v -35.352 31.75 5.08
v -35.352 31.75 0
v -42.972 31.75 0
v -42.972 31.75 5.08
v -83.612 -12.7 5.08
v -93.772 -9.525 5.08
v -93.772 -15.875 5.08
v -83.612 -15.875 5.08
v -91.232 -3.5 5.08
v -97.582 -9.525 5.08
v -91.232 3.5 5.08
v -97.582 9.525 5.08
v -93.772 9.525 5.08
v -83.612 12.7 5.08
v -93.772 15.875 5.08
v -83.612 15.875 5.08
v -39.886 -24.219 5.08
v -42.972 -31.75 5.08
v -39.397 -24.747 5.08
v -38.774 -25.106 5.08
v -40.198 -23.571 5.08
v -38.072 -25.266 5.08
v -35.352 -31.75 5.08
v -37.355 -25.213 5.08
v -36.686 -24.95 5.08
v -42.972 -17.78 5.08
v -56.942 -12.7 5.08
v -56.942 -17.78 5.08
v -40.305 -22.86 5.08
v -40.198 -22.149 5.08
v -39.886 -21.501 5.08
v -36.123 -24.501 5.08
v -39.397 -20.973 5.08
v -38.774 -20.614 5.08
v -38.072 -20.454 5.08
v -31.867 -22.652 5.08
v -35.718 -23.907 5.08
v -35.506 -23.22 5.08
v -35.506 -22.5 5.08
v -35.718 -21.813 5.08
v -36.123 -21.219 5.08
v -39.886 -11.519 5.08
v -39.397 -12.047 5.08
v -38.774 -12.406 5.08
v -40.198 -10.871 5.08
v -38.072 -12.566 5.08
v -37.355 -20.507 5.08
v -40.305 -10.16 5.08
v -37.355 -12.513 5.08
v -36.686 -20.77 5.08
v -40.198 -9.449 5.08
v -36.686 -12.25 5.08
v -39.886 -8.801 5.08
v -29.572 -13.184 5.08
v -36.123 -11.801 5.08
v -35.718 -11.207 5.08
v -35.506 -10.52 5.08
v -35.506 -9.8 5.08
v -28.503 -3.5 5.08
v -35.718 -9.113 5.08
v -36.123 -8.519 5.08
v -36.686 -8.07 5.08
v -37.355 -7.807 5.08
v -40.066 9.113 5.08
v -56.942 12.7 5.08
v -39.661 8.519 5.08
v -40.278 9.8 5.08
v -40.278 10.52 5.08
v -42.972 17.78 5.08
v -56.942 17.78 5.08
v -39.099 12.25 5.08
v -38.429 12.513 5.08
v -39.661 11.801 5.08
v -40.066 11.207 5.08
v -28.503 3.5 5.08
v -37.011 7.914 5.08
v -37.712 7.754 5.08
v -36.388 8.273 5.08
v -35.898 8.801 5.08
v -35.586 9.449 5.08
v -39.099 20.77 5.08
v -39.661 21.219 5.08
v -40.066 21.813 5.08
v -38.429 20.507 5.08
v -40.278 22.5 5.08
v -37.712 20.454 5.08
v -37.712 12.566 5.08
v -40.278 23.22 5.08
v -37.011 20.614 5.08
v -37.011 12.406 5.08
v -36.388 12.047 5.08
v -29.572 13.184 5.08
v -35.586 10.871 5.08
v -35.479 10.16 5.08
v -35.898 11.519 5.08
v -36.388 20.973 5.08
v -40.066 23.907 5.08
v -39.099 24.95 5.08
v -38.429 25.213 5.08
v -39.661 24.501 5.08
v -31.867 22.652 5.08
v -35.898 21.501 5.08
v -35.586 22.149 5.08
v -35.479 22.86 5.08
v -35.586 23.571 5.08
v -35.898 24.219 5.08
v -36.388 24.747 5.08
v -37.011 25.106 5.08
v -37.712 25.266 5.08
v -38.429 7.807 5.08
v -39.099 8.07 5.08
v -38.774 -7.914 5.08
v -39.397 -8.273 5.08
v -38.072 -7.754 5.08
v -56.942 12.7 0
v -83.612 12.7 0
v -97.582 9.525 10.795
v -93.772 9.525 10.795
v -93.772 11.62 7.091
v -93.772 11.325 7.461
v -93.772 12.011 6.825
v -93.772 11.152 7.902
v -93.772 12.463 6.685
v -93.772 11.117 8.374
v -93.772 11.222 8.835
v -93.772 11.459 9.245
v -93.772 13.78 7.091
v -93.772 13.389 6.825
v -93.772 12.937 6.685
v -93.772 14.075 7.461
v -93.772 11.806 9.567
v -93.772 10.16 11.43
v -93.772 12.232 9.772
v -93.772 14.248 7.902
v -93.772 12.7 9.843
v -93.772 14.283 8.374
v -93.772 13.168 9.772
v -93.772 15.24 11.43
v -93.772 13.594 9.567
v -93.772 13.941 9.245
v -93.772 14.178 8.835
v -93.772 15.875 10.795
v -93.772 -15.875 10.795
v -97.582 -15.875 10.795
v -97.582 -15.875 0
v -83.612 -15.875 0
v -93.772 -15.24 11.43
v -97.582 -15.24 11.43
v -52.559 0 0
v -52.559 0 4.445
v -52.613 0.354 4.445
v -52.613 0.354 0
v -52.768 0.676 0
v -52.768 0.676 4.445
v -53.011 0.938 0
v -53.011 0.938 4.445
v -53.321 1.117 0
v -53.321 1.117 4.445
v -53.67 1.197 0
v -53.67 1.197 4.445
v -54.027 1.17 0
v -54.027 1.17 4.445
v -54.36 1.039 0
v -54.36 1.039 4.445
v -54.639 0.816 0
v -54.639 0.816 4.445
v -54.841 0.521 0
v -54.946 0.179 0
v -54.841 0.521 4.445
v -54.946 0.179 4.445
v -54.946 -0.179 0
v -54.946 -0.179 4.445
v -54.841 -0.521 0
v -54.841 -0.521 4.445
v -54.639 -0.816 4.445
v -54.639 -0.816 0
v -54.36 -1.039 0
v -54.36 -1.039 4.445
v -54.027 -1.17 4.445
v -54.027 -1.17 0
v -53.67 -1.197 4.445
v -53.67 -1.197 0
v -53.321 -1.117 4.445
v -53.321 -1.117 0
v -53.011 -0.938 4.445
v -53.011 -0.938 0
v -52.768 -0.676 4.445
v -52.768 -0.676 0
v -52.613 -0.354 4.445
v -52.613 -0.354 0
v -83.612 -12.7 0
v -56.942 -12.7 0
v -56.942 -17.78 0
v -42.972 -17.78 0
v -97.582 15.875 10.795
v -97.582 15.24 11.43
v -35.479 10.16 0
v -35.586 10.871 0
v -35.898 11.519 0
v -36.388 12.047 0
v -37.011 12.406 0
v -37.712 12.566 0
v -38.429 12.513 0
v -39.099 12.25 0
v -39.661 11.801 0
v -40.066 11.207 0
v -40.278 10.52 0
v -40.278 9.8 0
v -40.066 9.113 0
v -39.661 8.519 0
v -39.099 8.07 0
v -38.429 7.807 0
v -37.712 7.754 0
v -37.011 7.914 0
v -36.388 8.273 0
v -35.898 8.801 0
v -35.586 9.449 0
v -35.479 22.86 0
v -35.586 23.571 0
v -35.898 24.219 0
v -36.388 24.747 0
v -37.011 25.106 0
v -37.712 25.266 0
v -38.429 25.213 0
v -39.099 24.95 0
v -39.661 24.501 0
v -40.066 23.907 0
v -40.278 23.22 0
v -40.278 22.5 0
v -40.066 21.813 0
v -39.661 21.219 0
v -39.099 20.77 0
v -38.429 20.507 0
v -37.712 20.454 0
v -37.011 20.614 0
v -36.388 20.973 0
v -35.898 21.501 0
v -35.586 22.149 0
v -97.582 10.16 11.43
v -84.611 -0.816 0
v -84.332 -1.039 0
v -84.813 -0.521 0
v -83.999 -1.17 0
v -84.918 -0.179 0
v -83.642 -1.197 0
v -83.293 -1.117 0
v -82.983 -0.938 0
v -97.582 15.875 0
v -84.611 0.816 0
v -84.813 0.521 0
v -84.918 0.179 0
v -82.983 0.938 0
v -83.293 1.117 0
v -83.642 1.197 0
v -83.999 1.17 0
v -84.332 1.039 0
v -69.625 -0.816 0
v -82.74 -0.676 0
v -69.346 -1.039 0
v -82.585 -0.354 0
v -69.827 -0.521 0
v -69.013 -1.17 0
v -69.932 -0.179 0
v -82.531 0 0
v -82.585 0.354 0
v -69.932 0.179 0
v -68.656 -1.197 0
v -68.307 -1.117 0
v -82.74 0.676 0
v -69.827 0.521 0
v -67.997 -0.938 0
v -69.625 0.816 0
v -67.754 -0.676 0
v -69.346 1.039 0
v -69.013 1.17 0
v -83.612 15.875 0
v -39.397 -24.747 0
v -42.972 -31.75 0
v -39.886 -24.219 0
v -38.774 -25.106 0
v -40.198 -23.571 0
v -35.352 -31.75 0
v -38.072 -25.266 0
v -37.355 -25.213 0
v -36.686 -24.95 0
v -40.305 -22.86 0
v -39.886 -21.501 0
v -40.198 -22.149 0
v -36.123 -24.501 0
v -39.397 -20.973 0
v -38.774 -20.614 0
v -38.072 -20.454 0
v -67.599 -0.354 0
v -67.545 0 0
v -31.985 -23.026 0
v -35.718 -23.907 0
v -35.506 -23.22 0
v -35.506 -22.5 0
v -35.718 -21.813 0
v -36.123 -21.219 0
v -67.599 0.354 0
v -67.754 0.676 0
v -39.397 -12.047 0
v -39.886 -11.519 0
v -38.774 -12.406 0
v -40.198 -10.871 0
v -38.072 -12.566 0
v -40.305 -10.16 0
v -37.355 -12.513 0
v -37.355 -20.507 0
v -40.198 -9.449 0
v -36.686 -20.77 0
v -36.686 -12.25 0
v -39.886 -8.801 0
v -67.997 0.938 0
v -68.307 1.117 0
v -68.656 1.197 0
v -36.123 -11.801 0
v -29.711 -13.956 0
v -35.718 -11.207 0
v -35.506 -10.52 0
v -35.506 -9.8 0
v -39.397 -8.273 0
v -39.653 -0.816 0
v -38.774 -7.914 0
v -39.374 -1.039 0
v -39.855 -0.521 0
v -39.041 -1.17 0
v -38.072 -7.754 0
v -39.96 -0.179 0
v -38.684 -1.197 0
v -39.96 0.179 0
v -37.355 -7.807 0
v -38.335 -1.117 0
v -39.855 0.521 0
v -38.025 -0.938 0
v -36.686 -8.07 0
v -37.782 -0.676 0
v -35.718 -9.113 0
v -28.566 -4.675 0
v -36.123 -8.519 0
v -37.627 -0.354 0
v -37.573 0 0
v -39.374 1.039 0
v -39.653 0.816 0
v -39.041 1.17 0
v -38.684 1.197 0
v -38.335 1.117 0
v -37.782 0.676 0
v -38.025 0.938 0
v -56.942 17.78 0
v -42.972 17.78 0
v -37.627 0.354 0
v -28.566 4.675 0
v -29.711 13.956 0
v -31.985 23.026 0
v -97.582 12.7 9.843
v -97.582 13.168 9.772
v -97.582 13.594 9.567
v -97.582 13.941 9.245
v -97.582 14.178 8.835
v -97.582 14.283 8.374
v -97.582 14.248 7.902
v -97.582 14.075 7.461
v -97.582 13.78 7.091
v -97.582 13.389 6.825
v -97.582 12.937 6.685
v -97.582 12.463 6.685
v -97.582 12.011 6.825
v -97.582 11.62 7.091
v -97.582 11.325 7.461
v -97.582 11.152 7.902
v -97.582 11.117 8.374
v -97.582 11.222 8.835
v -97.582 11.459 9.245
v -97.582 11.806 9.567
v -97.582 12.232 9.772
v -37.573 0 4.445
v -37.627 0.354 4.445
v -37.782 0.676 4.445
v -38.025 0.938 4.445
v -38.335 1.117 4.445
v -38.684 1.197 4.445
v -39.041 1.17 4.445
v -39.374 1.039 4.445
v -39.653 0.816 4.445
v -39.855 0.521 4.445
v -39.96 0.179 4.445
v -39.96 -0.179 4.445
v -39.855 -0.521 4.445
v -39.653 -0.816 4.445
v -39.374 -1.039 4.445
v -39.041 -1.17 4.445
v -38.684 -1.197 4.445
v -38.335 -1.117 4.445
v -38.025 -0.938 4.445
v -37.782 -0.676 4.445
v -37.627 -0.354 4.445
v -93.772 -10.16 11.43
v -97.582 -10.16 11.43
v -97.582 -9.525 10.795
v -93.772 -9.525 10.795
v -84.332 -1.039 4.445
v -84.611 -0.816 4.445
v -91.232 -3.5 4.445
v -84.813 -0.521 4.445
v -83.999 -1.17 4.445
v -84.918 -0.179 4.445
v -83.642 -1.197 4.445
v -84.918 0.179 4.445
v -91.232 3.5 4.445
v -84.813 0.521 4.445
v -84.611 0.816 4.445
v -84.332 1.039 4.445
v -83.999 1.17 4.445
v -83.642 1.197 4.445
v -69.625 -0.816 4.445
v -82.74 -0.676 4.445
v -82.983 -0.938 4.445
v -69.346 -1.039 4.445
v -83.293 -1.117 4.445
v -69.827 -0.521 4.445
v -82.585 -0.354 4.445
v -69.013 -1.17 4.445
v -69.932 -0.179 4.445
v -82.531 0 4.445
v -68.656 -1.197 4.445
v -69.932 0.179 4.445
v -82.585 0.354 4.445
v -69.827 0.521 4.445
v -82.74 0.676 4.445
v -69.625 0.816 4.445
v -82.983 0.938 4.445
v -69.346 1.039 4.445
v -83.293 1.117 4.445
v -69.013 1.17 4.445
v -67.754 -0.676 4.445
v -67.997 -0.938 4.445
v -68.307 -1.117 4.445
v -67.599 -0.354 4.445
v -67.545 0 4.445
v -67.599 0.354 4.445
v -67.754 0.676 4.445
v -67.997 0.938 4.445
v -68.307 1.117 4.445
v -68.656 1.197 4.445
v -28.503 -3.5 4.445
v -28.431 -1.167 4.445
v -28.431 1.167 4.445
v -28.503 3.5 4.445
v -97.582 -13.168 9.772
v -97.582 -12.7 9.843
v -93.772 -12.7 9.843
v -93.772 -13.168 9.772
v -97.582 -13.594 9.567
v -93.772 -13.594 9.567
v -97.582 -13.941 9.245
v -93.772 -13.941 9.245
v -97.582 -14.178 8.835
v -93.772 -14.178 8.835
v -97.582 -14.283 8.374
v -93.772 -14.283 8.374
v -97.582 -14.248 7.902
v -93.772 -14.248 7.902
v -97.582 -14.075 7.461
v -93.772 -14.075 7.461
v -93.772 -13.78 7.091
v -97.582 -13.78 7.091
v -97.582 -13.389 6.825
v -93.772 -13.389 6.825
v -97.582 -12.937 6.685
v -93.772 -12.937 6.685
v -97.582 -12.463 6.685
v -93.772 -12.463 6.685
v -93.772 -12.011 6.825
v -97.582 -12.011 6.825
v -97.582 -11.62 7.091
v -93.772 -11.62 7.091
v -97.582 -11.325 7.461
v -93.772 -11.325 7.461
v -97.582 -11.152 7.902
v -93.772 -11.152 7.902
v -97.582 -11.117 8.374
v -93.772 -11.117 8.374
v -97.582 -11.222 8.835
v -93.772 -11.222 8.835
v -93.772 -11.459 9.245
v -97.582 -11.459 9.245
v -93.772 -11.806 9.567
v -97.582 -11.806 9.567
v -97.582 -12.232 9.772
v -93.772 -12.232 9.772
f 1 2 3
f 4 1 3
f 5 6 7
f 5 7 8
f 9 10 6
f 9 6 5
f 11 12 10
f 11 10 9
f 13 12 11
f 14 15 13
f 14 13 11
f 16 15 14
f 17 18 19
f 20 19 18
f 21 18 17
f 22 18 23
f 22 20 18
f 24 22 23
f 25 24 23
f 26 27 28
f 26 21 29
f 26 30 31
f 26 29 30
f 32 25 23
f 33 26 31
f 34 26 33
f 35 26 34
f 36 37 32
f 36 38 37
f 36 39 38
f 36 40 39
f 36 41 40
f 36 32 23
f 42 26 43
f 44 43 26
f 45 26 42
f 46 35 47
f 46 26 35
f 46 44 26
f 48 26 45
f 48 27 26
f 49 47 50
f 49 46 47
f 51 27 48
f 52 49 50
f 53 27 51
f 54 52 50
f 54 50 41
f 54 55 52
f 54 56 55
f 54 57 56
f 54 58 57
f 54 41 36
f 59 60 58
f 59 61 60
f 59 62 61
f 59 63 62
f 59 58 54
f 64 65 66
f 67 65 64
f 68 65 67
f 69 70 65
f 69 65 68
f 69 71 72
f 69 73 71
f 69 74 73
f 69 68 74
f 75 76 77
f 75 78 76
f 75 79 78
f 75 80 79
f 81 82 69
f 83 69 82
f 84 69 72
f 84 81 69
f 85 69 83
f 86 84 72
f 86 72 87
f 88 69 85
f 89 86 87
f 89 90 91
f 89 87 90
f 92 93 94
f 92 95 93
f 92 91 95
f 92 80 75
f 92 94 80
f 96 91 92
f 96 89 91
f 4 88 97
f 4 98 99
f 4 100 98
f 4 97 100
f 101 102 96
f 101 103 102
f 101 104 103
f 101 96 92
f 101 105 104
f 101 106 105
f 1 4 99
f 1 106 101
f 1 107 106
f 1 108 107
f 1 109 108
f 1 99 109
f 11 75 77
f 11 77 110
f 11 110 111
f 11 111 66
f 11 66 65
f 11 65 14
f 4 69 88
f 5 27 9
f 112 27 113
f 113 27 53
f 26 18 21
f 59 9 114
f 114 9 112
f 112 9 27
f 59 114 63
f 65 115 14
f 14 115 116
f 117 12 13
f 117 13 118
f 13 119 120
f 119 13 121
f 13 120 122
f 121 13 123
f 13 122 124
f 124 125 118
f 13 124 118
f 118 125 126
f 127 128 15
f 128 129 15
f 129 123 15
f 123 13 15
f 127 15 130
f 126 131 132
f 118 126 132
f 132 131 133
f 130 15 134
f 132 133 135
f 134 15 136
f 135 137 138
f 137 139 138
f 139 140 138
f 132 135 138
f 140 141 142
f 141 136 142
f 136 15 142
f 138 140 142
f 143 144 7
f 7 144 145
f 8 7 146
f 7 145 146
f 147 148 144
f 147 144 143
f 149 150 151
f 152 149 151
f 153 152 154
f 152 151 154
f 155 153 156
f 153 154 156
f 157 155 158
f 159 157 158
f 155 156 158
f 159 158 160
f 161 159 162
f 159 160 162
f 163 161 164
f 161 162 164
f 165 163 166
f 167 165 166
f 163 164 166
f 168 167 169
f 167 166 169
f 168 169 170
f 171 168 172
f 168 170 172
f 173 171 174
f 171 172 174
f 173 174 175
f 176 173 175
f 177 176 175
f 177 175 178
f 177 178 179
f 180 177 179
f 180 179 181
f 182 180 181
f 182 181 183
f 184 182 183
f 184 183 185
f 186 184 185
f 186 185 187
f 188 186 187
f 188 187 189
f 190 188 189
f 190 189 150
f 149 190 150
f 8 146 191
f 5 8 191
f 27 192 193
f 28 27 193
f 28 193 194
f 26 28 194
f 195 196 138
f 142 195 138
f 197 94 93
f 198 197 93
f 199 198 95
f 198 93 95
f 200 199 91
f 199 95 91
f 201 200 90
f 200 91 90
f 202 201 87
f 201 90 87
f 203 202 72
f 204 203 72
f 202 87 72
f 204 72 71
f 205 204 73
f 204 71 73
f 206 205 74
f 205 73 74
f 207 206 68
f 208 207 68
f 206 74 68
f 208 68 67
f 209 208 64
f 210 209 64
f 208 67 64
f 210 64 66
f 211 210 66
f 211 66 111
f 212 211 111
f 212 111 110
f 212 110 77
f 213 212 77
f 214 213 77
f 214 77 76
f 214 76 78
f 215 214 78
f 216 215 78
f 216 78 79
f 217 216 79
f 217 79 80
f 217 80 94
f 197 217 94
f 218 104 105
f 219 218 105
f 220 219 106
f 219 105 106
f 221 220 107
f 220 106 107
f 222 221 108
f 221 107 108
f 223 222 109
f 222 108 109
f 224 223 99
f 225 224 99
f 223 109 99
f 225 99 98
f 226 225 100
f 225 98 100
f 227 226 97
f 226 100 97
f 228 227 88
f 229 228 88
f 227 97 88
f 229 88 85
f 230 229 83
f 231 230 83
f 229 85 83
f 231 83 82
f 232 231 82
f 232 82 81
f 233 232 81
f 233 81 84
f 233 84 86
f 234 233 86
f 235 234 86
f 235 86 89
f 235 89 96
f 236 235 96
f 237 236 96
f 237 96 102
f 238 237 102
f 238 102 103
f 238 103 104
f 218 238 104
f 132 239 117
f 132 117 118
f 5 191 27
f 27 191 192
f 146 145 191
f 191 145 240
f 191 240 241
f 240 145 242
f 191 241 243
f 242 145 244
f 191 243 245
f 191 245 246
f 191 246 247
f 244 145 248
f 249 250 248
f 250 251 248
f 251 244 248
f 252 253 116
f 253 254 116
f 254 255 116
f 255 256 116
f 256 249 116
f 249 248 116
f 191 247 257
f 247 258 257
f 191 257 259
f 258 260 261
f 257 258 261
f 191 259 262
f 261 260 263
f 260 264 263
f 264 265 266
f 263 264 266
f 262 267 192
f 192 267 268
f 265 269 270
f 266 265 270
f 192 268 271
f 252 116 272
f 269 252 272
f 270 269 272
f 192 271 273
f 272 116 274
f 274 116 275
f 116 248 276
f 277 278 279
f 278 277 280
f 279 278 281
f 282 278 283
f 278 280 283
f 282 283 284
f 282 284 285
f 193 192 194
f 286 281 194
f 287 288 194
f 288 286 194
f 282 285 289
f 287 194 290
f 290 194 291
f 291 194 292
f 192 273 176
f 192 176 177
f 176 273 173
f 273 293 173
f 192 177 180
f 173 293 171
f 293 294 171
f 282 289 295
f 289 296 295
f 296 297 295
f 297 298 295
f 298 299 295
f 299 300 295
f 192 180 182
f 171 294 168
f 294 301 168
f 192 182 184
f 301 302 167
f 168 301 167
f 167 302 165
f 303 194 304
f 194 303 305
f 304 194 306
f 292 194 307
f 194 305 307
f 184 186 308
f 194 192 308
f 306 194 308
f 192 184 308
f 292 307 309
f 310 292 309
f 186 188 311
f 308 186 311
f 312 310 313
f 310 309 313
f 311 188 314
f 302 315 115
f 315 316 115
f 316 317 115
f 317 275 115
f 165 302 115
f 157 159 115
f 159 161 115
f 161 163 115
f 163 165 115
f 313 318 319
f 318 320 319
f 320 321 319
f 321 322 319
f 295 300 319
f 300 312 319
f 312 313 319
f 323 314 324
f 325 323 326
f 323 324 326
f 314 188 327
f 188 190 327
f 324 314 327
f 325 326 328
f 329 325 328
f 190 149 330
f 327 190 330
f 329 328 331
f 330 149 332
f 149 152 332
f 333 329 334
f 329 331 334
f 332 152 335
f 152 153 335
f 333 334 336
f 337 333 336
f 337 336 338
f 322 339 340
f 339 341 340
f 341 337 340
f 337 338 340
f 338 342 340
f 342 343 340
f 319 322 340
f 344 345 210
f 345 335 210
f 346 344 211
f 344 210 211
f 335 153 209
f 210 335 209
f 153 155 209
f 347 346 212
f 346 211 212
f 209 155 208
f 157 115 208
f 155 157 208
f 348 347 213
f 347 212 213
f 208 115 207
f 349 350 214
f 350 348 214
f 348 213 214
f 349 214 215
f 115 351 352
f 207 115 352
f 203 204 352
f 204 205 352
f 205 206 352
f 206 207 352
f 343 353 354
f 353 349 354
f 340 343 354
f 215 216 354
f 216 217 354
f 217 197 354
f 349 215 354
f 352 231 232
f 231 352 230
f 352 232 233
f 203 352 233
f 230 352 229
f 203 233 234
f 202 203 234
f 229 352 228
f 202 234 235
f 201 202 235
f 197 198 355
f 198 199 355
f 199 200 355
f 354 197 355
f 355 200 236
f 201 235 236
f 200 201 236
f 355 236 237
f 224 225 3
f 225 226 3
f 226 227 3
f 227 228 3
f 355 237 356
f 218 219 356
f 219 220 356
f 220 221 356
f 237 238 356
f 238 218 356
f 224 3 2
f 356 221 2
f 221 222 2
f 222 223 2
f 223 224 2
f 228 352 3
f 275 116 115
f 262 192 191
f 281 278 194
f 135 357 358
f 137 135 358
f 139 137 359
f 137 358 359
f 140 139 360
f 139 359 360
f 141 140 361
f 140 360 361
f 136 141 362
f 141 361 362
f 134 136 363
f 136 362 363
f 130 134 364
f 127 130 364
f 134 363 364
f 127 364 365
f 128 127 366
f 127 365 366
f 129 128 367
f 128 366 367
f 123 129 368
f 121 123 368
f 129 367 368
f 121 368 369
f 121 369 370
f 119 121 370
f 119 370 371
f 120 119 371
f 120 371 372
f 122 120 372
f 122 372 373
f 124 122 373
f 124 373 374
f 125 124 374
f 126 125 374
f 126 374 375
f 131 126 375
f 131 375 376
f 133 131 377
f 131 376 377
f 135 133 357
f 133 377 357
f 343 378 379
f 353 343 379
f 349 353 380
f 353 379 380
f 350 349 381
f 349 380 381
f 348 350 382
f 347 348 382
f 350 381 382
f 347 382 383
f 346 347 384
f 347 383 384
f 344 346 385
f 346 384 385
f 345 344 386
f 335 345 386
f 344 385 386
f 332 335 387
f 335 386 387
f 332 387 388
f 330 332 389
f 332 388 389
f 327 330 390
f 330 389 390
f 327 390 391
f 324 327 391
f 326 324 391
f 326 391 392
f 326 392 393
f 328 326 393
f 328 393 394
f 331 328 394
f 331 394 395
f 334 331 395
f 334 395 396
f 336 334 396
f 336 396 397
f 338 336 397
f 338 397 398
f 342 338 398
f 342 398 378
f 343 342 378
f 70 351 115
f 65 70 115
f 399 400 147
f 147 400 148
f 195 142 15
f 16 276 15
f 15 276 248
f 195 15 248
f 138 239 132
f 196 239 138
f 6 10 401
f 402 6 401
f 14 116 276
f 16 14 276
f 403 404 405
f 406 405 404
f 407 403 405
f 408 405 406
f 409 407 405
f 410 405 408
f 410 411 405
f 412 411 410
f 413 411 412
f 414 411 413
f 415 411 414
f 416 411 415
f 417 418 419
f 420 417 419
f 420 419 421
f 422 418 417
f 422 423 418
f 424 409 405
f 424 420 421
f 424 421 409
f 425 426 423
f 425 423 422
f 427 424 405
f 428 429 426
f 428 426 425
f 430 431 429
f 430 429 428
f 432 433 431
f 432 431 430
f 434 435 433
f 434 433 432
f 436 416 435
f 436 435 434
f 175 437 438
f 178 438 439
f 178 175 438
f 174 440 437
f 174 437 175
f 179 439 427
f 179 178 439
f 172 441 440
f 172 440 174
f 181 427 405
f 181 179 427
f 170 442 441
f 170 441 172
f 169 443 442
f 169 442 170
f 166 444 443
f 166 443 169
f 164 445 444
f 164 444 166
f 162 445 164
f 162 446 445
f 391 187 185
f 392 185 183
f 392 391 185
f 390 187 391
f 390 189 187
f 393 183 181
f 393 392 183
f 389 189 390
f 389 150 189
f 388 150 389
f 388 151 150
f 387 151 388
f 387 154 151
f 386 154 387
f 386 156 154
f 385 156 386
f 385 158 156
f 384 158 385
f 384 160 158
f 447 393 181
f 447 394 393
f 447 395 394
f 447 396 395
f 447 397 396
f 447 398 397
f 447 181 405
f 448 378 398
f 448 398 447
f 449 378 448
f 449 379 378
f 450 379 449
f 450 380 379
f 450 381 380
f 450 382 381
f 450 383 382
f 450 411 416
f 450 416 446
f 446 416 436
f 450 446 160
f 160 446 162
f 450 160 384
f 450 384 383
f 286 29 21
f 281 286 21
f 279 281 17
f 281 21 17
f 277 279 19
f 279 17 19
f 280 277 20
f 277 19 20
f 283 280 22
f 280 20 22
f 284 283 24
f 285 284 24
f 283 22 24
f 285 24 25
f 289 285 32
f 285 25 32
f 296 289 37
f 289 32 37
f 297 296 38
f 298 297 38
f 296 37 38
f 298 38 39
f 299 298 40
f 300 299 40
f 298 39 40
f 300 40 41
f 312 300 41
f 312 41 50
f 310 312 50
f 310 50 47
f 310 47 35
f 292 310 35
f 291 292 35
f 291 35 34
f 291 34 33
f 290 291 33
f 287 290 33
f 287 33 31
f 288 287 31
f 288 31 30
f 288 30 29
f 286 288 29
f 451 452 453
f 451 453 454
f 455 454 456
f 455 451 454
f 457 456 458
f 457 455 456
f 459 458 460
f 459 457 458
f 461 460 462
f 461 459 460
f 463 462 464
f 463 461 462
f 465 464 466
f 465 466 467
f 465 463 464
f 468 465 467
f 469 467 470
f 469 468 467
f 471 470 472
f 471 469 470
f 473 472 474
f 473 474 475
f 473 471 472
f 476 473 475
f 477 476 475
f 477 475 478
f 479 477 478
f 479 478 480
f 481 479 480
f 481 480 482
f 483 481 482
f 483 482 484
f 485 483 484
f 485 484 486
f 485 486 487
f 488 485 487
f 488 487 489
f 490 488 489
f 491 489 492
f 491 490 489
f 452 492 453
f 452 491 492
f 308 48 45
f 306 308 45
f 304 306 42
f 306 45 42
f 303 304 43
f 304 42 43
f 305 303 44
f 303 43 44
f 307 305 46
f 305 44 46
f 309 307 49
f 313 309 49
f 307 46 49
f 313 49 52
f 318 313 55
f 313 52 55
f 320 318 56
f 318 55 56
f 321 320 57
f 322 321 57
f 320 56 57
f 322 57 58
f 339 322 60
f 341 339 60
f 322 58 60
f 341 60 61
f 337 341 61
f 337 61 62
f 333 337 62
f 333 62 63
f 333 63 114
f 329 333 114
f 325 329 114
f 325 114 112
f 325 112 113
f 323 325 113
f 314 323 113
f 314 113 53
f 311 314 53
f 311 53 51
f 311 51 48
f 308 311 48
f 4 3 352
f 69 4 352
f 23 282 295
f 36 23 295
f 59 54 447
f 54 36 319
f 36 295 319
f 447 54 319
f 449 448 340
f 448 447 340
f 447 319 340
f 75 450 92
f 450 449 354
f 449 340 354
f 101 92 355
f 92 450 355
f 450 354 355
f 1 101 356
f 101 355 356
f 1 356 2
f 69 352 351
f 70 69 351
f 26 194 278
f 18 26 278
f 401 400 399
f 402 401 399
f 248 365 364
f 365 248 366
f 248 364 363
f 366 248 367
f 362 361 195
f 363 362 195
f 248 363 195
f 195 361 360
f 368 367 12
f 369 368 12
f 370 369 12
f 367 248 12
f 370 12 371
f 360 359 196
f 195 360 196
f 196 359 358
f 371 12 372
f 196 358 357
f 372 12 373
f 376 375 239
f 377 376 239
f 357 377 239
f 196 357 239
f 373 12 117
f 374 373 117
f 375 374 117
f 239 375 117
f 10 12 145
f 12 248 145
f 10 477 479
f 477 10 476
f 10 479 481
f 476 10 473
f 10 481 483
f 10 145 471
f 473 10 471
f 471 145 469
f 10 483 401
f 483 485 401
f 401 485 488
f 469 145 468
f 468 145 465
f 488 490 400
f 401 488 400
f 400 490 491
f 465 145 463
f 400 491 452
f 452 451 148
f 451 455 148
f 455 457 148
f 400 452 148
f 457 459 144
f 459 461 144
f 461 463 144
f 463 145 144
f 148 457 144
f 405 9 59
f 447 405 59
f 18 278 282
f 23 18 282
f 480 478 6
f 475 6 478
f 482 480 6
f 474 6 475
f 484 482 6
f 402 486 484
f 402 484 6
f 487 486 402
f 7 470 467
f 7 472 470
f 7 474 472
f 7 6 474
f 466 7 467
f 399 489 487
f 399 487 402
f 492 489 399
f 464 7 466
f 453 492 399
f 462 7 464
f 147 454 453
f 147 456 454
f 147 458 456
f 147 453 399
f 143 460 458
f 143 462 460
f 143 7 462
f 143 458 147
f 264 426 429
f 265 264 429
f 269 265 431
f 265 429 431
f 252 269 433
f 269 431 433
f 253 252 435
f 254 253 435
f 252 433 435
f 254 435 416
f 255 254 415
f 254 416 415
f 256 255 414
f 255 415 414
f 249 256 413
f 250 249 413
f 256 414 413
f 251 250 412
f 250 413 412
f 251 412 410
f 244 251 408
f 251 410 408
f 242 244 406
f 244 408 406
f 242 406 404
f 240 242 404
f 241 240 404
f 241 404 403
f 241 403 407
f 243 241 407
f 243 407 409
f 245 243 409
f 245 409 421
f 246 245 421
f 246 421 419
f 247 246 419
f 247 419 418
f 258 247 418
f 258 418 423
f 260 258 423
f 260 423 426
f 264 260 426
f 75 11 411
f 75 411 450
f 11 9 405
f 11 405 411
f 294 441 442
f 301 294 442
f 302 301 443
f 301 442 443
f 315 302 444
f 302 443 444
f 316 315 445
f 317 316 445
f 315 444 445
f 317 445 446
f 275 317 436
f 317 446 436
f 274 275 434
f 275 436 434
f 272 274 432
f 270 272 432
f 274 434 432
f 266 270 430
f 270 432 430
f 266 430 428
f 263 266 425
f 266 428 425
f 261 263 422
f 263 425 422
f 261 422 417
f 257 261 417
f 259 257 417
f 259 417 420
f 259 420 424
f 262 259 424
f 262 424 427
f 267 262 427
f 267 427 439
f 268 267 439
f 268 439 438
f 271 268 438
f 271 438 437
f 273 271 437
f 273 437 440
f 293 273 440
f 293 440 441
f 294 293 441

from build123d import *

# Parameters (mm, degrees)
BOSS_EXTRUDE1_DEPTH      = 5.08
SKETCH2_W                = 63.5
SKETCH2_H                = 7
CUT_EXTRUDE1_DEPTH       = 0.635
SKETCH3_W                = 6.35
SKETCH3_H                = 6.35
SKETCH3_R                = 1.5875
BOSS_EXTRUDE2_DEPTH      = 3.81
CHAMFER1_SIZE            = 0.635
CHAMFER1_OF_MIRROR1_SIZE = 0.635
SKETCH6_R                = 2.413
CUT_EXTRUDE2_DEPTH       = 103.813663911
SKETCH7_R                = 1.20015
CUT_EXTRUDE3_DEPTH       = 103.854835627


with BuildPart() as part:
    # Sketch1 → Boss-Extrude1 (new body)
    with BuildSketch(Plane.XY):
        with BuildLine():
            Line((-35.352091015, 31.75), (-42.972091015, 31.75))
            Line((-42.972091015, 31.75), (-42.972091015, 17.78))
            Line((-42.972091015, 17.78), (-56.942091015, 17.78))
            Line((-56.942091015, 17.78), (-56.942091015, 12.7))
            Line((-56.942091015, 12.7), (-83.612091015, 12.7))
            Line((-83.612091015, 12.7), (-83.612091015, 15.875))
            Line((-83.612091015, 15.875), (-97.582091015, 15.875))
            Line((-97.582091015, 15.875), (-97.582091015, -15.875))
            Line((-97.582091015, -15.875), (-83.612091015, -15.875))
            Line((-83.612091015, -15.875), (-83.612091015, -12.7))
            Line((-83.612091015, -12.7), (-56.942091015, -12.7))
            Line((-56.942091015, -12.7), (-56.942091015, -17.78))
            Line((-56.942091015, -17.78), (-42.972091015, -17.78))
            Line((-42.972091015, -17.78), (-42.972091015, -31.75))
            Line((-42.972091015, -31.75), (-35.352091015, -31.75))
            ThreePointArc((-35.352091015, -31.75), (-28.422412943, 0), (-35.352091015, 31.75))
        make_face()
    extrude(amount=BOSS_EXTRUDE1_DEPTH)

    # Sketch2 → Cut-Extrude1 (cut)
    with BuildSketch(Plane.XY.offset(5.08)):
        with Locations((-59.482091015, 0)):
            Rectangle(SKETCH2_W, SKETCH2_H)
    extrude(amount=-CUT_EXTRUDE1_DEPTH, mode=Mode.SUBTRACT)

    # Sketch3 → Boss-Extrude2 (add)
    with BuildSketch(Plane.ZY.offset(97.582091015)):
        with Locations((8.255, 12.7)):
            Rectangle(SKETCH3_W, SKETCH3_H)
        with Locations((8.255, 12.7)):
            Circle(SKETCH3_R, mode=Mode.SUBTRACT)
    boss_extrude2 = extrude(amount=-BOSS_EXTRUDE2_DEPTH)

    # Chamfer1
    chamfer1_edges = [part.edges().sort_by_distance(p)[0] for p in [
        (-95.677091015, 9.525, 11.43),
        (-95.677091015, 15.875, 11.43),
    ]]
    chamfer(chamfer1_edges, length=CHAMFER1_SIZE)

    # Mirror1: Boss-Extrude2 across plane
    add(boss_extrude2.mirror(Plane.ZX))

    # Chamfer1 of Mirror1
    chamfer1_of_mirror1_edges = [part.edges().sort_by_distance(p)[0] for p in [
        (-95.677091015, -9.525, 11.43),
        (-95.677091015, -15.875, 11.43),
    ]]
    chamfer(chamfer1_of_mirror1_edges, length=CHAMFER1_OF_MIRROR1_SIZE)

    # Sketch6 → Cut-Extrude2 (cut, through all)
    with BuildSketch(Plane.XY.offset(5.08)):
        with Locations((-37.892091015, 22.86)):
            Circle(SKETCH6_R)
        with Locations((-37.892091015, 10.16)):
            Circle(SKETCH6_R)
        with Locations(Location((-37.892091015, -10.16, 0), (0, 0, 180))):
            Circle(SKETCH6_R)
        with Locations(Location((-37.892091015, -22.86, 0), (0, 0, 180))):
            Circle(SKETCH6_R)
    extrude(amount=-CUT_EXTRUDE2_DEPTH, mode=Mode.SUBTRACT)

    # Sketch7 → Cut-Extrude3 (cut, through all)
    with BuildSketch(Plane.XY.offset(4.445)):
        with Locations((-83.731471015, 0)):
            Circle(SKETCH7_R)
        with Locations((-68.745471015, 0)):
            Circle(SKETCH7_R)
        with Locations((-53.759471015, 0)):
            Circle(SKETCH7_R)
        with Locations((-38.773471015, 0)):
            Circle(SKETCH7_R)
    extrude(amount=-CUT_EXTRUDE3_DEPTH, mode=Mode.SUBTRACT)


solid = part.part
